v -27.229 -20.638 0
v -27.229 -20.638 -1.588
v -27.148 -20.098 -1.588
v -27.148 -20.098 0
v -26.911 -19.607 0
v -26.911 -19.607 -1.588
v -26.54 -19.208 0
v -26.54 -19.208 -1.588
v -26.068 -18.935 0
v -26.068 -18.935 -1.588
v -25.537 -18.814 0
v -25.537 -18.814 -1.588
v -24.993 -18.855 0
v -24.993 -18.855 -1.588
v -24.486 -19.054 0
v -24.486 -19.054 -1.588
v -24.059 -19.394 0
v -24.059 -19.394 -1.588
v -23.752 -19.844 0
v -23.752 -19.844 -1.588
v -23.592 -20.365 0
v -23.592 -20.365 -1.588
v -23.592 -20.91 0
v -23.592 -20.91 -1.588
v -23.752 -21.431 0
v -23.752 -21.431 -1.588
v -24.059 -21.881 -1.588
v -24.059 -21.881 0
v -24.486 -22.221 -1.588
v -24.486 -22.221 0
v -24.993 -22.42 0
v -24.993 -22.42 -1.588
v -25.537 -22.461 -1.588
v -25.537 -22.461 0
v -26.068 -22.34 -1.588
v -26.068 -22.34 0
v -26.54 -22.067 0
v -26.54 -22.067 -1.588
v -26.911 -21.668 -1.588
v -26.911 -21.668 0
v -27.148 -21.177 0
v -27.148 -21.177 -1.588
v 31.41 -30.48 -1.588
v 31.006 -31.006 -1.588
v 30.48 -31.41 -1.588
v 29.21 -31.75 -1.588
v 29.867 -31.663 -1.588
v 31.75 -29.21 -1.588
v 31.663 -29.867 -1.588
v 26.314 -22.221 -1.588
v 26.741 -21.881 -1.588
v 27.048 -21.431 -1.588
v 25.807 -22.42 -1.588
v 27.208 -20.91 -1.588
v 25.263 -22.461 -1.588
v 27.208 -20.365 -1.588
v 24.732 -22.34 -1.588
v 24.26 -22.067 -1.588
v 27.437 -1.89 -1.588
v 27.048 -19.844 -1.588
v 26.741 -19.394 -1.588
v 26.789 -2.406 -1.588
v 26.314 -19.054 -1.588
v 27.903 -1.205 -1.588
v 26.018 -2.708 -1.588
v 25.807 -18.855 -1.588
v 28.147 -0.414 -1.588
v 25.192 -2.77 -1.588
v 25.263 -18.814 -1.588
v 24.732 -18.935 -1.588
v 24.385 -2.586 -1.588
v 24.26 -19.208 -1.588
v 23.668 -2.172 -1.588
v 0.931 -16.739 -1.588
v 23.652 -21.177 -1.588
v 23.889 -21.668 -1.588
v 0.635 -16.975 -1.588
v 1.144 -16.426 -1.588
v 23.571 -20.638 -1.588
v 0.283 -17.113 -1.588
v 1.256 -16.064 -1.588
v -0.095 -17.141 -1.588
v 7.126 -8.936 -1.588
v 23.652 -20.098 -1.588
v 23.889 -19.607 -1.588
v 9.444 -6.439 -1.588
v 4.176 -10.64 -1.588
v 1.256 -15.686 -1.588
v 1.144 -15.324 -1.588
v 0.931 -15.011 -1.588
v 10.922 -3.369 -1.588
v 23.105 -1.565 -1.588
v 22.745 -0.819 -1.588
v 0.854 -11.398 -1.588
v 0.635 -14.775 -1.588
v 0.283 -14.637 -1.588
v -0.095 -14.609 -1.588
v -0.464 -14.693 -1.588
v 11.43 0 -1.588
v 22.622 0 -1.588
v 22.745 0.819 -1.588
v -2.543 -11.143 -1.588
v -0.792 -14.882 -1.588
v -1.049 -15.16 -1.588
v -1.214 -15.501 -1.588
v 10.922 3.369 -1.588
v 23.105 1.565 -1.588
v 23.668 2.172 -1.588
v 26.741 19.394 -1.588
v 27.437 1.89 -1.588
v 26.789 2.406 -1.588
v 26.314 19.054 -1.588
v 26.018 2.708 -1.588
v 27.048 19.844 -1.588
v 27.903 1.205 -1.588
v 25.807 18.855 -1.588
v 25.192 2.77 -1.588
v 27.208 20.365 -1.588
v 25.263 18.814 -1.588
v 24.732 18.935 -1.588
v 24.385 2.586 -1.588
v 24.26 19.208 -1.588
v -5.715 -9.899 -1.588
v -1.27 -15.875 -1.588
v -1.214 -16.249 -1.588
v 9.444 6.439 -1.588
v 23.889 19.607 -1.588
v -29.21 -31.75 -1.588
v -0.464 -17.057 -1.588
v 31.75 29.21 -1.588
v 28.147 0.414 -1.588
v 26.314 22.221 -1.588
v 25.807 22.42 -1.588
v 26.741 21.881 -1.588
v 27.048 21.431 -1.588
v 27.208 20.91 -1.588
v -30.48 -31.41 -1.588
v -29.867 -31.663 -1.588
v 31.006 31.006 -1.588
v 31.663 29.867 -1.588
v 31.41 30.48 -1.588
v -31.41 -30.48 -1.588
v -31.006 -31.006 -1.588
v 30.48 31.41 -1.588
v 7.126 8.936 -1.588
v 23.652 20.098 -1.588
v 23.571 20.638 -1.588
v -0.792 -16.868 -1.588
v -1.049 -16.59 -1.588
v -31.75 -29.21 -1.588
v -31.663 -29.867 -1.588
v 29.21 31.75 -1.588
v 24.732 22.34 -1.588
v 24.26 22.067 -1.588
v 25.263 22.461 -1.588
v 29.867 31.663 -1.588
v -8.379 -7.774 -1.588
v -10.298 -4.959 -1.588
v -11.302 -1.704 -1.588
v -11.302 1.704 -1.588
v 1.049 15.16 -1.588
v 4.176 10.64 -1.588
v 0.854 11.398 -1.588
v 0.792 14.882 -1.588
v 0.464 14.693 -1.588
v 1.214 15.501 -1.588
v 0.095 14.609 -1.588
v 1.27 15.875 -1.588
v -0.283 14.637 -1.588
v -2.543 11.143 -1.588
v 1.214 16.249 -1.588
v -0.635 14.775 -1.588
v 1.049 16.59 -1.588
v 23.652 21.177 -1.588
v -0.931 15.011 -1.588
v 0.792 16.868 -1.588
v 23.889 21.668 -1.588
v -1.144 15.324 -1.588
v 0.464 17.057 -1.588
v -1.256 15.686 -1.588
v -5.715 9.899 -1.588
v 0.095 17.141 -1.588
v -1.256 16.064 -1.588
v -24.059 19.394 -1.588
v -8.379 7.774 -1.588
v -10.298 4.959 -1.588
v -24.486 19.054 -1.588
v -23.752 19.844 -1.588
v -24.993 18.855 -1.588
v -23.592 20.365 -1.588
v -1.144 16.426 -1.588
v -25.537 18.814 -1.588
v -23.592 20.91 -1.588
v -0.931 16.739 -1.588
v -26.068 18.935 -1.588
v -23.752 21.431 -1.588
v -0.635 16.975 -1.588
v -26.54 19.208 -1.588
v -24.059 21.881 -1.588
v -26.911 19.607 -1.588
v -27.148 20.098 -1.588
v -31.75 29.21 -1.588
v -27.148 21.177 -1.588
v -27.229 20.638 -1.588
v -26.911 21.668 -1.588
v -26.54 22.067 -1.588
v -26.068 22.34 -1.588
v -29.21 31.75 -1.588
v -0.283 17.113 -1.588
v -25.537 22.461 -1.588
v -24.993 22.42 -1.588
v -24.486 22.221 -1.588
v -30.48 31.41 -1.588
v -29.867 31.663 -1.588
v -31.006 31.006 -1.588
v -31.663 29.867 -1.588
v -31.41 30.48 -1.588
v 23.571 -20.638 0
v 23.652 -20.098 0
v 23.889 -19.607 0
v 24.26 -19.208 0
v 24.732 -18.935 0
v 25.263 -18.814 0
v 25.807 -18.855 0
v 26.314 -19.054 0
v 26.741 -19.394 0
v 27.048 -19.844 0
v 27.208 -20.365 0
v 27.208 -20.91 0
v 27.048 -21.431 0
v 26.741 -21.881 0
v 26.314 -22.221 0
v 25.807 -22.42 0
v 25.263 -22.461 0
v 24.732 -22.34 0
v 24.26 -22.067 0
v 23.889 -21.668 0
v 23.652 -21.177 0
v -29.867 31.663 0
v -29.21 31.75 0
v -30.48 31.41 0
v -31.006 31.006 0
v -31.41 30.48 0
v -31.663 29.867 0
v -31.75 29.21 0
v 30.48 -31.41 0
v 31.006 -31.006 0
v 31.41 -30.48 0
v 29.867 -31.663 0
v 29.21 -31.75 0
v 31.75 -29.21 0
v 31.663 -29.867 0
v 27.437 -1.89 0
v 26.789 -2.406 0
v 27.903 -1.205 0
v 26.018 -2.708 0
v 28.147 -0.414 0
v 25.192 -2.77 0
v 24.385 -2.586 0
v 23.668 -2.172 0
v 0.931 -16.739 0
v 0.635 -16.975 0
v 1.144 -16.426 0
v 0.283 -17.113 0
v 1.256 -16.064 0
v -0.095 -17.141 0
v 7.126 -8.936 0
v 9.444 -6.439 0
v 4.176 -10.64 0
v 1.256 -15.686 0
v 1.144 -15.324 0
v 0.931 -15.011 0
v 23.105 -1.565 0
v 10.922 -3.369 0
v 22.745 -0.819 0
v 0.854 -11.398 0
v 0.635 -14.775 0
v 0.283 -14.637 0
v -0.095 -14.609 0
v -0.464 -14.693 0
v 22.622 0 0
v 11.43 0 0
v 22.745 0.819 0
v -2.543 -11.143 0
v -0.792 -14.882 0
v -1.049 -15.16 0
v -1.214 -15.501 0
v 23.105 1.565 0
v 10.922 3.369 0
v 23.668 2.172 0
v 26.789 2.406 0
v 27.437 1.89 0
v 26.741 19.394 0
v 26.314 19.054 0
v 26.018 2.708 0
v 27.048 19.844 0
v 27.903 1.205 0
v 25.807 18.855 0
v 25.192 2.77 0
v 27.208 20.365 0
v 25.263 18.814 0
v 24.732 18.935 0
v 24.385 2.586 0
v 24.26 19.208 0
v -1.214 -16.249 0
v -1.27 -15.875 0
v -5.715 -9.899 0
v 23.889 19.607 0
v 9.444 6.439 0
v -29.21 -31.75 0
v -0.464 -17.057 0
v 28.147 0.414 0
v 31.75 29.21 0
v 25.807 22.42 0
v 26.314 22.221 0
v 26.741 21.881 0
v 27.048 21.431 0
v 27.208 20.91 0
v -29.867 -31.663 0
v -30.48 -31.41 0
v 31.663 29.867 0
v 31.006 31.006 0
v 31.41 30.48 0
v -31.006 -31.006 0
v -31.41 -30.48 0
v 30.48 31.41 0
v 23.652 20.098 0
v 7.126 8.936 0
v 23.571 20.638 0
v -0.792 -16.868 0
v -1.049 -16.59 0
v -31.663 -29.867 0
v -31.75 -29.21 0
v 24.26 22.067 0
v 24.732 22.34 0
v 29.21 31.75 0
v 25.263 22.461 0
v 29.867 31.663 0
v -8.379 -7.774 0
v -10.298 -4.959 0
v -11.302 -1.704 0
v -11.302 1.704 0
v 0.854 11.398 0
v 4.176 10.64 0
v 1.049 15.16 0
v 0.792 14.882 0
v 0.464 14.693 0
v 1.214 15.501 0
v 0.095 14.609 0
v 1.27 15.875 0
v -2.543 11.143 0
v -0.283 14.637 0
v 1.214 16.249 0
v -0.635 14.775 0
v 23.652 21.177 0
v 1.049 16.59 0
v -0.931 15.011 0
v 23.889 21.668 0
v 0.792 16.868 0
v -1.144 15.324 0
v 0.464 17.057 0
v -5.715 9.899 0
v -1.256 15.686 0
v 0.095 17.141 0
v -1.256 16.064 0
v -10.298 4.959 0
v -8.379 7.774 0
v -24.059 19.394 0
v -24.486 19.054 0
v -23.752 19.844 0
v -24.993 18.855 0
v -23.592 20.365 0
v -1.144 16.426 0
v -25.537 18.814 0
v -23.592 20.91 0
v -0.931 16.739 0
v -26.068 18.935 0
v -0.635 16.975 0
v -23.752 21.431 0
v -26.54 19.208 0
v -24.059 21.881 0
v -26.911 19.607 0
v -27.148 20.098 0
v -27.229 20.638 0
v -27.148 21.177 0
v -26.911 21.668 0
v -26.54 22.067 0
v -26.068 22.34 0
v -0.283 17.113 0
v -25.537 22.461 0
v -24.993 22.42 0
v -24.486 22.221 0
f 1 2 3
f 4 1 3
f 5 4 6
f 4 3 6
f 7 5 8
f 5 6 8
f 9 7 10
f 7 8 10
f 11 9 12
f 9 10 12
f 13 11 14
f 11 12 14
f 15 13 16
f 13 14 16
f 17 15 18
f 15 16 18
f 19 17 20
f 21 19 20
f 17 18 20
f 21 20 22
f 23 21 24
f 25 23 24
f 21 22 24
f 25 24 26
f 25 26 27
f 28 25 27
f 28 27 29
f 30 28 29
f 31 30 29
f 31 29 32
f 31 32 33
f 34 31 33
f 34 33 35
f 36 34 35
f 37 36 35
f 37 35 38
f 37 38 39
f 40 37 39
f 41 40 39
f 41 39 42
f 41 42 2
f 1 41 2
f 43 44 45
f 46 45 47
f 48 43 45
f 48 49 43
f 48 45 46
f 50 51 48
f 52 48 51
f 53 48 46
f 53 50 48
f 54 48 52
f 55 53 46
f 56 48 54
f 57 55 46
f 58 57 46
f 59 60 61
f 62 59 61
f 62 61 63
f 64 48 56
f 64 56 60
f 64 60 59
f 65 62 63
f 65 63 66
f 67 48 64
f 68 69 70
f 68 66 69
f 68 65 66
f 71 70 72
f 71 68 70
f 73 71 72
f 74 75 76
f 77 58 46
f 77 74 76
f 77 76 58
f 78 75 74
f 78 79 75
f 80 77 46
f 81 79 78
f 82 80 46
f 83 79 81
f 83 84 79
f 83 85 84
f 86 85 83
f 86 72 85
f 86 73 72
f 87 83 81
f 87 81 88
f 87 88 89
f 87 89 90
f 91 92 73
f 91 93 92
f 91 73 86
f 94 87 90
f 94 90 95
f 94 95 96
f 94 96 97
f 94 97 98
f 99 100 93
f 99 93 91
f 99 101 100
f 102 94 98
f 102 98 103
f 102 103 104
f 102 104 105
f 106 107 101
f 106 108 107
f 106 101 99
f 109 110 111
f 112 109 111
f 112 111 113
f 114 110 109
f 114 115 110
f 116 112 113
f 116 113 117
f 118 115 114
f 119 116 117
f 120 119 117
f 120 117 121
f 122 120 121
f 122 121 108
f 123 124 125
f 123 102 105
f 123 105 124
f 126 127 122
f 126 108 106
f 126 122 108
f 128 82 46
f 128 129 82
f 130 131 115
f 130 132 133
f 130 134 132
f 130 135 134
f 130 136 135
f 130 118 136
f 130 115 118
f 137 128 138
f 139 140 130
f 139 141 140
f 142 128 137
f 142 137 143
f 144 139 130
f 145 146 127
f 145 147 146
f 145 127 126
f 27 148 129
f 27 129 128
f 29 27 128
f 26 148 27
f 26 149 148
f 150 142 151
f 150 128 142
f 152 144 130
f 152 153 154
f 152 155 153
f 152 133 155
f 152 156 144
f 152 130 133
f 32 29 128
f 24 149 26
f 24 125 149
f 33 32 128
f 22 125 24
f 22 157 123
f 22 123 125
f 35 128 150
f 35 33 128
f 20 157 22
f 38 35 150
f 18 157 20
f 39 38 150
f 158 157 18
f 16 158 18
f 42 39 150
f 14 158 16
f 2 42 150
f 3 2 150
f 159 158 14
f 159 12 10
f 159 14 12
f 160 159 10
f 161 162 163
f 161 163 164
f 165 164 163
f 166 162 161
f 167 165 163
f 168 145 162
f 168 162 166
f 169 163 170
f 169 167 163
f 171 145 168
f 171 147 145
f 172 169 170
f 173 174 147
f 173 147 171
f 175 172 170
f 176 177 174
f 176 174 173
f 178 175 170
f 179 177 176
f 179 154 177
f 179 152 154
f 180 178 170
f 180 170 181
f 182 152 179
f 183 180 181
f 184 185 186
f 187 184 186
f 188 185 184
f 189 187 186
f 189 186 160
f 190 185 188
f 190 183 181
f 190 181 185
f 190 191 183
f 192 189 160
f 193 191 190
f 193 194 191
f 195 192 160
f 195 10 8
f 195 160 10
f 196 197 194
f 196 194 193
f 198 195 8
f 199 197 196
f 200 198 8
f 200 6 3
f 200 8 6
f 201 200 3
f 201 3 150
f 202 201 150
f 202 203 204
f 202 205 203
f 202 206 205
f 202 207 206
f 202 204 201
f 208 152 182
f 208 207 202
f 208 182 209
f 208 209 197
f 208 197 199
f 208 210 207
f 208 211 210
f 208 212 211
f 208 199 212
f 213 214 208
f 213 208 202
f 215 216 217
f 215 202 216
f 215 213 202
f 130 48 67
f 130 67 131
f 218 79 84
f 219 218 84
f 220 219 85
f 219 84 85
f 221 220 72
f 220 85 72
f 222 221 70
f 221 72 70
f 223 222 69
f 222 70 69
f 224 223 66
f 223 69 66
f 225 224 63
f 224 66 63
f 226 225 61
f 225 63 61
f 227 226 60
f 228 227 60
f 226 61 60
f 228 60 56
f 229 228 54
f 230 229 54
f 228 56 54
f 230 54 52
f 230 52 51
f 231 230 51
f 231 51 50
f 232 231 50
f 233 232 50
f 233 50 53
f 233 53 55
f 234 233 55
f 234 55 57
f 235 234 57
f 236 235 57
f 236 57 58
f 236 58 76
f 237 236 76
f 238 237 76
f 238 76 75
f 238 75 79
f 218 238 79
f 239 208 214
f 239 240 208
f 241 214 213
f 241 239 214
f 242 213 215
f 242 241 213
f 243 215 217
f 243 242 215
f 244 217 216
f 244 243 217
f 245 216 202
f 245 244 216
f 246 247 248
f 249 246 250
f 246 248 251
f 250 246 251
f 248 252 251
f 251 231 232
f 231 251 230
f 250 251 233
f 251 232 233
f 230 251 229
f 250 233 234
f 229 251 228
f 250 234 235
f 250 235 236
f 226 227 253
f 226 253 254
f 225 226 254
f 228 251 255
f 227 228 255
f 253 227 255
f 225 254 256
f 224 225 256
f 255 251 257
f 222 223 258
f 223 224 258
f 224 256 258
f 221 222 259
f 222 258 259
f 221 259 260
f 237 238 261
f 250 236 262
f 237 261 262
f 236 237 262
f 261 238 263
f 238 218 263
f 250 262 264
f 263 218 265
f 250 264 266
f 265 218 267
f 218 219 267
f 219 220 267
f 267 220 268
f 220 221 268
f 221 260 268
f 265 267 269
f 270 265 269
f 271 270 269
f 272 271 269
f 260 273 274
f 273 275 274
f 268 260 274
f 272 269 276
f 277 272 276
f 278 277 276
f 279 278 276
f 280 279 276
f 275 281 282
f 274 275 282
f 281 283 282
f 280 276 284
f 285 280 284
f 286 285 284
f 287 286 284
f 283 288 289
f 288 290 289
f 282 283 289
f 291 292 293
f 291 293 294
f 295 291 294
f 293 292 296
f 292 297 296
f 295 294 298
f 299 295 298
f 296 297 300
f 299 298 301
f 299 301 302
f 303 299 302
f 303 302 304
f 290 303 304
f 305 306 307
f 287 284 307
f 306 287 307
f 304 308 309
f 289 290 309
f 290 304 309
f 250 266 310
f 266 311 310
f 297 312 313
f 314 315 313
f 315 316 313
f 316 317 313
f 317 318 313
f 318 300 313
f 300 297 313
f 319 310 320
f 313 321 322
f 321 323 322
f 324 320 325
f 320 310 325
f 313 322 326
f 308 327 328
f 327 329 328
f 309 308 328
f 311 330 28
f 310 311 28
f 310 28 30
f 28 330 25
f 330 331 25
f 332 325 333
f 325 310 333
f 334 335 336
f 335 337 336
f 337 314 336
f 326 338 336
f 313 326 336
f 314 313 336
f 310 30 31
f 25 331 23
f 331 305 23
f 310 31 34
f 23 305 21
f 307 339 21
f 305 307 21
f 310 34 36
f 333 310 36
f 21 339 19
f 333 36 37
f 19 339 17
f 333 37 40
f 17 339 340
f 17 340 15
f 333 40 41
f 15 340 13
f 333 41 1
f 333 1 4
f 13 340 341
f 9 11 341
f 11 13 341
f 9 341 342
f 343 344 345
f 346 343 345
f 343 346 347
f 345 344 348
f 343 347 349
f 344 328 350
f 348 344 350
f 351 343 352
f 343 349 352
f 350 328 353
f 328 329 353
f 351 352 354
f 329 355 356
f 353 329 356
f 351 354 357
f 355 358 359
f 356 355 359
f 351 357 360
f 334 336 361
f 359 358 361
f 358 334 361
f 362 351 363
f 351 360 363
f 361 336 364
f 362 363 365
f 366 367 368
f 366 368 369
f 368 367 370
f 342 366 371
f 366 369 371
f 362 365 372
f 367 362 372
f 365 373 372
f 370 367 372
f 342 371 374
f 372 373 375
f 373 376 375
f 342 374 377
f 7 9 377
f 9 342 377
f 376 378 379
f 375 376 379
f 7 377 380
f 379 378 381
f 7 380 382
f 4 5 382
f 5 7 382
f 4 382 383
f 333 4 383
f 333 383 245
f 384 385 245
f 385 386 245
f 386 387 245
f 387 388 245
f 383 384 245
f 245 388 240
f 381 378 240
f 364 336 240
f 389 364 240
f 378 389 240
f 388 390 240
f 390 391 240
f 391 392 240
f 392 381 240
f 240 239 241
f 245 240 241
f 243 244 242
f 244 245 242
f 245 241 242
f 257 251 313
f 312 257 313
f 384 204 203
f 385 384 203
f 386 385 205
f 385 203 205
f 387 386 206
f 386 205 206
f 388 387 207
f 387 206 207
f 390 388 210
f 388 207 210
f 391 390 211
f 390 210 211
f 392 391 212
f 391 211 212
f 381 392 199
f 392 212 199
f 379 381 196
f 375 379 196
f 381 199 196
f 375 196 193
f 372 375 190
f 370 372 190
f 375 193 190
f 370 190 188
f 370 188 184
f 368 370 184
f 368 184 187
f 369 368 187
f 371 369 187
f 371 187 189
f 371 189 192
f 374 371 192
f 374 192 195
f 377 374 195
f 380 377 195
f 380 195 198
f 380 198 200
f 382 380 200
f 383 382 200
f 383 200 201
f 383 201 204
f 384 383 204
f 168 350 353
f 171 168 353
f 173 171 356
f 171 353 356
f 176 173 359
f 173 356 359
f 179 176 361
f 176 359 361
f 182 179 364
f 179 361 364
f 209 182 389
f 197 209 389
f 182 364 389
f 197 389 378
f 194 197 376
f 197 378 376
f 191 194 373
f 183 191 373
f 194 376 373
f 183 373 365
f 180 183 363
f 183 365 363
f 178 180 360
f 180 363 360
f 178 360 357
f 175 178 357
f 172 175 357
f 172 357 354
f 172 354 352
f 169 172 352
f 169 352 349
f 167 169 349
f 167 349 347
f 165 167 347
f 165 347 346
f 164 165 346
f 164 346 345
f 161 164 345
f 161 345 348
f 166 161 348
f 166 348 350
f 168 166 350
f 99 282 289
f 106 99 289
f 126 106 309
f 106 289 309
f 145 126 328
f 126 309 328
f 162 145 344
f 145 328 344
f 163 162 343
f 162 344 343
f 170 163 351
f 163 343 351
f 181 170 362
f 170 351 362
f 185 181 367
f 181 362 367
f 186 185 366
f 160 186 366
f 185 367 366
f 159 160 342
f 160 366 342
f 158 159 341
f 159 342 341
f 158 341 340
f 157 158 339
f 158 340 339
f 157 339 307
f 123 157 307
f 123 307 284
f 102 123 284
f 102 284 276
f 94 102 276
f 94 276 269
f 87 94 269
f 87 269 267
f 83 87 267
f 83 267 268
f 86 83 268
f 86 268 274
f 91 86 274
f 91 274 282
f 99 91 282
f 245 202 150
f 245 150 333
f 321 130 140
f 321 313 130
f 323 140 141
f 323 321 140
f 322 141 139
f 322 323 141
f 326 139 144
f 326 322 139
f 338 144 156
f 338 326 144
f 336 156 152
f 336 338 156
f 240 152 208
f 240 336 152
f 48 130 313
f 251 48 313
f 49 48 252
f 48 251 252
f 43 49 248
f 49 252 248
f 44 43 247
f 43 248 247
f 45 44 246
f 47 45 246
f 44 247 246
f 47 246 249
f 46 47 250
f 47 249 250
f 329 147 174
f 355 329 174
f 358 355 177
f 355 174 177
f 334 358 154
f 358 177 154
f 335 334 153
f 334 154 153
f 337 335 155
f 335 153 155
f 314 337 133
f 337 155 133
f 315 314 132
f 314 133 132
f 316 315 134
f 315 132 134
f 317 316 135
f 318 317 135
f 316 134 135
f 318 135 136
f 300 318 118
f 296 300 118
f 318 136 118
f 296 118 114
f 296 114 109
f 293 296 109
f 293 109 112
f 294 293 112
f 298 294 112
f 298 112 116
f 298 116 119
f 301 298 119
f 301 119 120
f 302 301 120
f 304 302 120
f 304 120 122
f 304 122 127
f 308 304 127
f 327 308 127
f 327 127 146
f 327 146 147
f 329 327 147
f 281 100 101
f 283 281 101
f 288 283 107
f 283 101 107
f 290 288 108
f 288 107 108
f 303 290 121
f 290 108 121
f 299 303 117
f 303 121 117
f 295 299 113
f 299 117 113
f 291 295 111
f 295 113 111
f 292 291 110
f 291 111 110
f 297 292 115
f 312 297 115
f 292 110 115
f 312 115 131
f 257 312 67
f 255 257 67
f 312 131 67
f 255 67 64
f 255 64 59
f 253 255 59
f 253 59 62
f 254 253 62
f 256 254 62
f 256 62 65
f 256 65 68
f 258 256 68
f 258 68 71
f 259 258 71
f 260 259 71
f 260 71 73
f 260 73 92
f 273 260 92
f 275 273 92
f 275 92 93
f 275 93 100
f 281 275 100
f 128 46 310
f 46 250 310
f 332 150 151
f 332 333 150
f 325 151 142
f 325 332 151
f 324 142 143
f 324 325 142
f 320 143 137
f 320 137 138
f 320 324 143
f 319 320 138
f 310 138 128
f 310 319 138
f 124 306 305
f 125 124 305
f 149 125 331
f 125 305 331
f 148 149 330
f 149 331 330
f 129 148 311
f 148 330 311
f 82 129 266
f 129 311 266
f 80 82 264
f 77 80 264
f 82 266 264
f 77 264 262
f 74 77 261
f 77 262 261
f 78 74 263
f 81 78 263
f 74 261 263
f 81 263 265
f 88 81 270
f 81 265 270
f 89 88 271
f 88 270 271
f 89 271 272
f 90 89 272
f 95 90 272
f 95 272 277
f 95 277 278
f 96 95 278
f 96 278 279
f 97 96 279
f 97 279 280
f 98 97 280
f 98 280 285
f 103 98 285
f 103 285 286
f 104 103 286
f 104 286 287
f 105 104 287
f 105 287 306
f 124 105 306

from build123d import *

# Parameters (mm, degrees)
SKETCH3_W                       = 63.5
SKETCH3_H                       = 1.5875
BASE_FLANGE1_DEPTH              = 31.75
FILLET1_R                       = 2.54
F_27_0_144_DIAMETER_HOLE1_D     = 3.6576
SKETCH10_R                      = 11.43
SKETCH10_R_2                    = 1.27
CUT_EXTRUDE1_DEPTH              = 45.929335141
F_7_32_0_21875_DIAMETER_HOLE1_D = 5.55625


# Sheet-metal steps are written as plain solids
with BuildPart() as part:
    # Sketch3 → Base-Flange1 (new, symmetric)
    with BuildSketch(Plane(origin=(0, 0, 0), x_dir=(-1, 0, 0), z_dir=(0, 1, 0))):
        with Locations((0, -0.79375)):
            Rectangle(SKETCH3_W, SKETCH3_H)
    extrude(amount=BASE_FLANGE1_DEPTH, both=True)

    # Fillet1
    fillet1_edges = [part.edges().sort_by_distance(p)[0] for p in [
        (31.75, 31.75, -0.79375),
        (31.75, -31.75, -0.79375),
        (-31.75, -31.75, -0.79375),
        (-31.75, 31.75, -0.79375),
    ]]
    fillet(fillet1_edges, radius=FILLET1_R)

    # #27 (0.144) Diameter Hole1 (through all)
    with Locations(Plane.XY):
        with Locations((-25.4, 20.6375), (25.4, 20.6375), (25.4, -20.6375), (-25.4, -20.6375)):
            Hole(F_27_0_144_DIAMETER_HOLE1_D / 2)

    # Sketch10 → Cut-Extrude1 (cut, through all)
    with BuildSketch(Plane.XY):
        Circle(SKETCH10_R)
        with Locations((0, 15.875)):
            Circle(SKETCH10_R_2)
        with Locations(Location((0, -15.875, 0), (0, 0, 180))):
            Circle(SKETCH10_R_2)
    extrude(amount=-CUT_EXTRUDE1_DEPTH, mode=Mode.SUBTRACT)

    # 7/32 (0.21875) Diameter Hole1 (through all)
    with Locations(Plane.XY):
        with Locations((25.4, 0)):
            Hole(F_7_32_0_21875_DIAMETER_HOLE1_D / 2)


solid = part.part
